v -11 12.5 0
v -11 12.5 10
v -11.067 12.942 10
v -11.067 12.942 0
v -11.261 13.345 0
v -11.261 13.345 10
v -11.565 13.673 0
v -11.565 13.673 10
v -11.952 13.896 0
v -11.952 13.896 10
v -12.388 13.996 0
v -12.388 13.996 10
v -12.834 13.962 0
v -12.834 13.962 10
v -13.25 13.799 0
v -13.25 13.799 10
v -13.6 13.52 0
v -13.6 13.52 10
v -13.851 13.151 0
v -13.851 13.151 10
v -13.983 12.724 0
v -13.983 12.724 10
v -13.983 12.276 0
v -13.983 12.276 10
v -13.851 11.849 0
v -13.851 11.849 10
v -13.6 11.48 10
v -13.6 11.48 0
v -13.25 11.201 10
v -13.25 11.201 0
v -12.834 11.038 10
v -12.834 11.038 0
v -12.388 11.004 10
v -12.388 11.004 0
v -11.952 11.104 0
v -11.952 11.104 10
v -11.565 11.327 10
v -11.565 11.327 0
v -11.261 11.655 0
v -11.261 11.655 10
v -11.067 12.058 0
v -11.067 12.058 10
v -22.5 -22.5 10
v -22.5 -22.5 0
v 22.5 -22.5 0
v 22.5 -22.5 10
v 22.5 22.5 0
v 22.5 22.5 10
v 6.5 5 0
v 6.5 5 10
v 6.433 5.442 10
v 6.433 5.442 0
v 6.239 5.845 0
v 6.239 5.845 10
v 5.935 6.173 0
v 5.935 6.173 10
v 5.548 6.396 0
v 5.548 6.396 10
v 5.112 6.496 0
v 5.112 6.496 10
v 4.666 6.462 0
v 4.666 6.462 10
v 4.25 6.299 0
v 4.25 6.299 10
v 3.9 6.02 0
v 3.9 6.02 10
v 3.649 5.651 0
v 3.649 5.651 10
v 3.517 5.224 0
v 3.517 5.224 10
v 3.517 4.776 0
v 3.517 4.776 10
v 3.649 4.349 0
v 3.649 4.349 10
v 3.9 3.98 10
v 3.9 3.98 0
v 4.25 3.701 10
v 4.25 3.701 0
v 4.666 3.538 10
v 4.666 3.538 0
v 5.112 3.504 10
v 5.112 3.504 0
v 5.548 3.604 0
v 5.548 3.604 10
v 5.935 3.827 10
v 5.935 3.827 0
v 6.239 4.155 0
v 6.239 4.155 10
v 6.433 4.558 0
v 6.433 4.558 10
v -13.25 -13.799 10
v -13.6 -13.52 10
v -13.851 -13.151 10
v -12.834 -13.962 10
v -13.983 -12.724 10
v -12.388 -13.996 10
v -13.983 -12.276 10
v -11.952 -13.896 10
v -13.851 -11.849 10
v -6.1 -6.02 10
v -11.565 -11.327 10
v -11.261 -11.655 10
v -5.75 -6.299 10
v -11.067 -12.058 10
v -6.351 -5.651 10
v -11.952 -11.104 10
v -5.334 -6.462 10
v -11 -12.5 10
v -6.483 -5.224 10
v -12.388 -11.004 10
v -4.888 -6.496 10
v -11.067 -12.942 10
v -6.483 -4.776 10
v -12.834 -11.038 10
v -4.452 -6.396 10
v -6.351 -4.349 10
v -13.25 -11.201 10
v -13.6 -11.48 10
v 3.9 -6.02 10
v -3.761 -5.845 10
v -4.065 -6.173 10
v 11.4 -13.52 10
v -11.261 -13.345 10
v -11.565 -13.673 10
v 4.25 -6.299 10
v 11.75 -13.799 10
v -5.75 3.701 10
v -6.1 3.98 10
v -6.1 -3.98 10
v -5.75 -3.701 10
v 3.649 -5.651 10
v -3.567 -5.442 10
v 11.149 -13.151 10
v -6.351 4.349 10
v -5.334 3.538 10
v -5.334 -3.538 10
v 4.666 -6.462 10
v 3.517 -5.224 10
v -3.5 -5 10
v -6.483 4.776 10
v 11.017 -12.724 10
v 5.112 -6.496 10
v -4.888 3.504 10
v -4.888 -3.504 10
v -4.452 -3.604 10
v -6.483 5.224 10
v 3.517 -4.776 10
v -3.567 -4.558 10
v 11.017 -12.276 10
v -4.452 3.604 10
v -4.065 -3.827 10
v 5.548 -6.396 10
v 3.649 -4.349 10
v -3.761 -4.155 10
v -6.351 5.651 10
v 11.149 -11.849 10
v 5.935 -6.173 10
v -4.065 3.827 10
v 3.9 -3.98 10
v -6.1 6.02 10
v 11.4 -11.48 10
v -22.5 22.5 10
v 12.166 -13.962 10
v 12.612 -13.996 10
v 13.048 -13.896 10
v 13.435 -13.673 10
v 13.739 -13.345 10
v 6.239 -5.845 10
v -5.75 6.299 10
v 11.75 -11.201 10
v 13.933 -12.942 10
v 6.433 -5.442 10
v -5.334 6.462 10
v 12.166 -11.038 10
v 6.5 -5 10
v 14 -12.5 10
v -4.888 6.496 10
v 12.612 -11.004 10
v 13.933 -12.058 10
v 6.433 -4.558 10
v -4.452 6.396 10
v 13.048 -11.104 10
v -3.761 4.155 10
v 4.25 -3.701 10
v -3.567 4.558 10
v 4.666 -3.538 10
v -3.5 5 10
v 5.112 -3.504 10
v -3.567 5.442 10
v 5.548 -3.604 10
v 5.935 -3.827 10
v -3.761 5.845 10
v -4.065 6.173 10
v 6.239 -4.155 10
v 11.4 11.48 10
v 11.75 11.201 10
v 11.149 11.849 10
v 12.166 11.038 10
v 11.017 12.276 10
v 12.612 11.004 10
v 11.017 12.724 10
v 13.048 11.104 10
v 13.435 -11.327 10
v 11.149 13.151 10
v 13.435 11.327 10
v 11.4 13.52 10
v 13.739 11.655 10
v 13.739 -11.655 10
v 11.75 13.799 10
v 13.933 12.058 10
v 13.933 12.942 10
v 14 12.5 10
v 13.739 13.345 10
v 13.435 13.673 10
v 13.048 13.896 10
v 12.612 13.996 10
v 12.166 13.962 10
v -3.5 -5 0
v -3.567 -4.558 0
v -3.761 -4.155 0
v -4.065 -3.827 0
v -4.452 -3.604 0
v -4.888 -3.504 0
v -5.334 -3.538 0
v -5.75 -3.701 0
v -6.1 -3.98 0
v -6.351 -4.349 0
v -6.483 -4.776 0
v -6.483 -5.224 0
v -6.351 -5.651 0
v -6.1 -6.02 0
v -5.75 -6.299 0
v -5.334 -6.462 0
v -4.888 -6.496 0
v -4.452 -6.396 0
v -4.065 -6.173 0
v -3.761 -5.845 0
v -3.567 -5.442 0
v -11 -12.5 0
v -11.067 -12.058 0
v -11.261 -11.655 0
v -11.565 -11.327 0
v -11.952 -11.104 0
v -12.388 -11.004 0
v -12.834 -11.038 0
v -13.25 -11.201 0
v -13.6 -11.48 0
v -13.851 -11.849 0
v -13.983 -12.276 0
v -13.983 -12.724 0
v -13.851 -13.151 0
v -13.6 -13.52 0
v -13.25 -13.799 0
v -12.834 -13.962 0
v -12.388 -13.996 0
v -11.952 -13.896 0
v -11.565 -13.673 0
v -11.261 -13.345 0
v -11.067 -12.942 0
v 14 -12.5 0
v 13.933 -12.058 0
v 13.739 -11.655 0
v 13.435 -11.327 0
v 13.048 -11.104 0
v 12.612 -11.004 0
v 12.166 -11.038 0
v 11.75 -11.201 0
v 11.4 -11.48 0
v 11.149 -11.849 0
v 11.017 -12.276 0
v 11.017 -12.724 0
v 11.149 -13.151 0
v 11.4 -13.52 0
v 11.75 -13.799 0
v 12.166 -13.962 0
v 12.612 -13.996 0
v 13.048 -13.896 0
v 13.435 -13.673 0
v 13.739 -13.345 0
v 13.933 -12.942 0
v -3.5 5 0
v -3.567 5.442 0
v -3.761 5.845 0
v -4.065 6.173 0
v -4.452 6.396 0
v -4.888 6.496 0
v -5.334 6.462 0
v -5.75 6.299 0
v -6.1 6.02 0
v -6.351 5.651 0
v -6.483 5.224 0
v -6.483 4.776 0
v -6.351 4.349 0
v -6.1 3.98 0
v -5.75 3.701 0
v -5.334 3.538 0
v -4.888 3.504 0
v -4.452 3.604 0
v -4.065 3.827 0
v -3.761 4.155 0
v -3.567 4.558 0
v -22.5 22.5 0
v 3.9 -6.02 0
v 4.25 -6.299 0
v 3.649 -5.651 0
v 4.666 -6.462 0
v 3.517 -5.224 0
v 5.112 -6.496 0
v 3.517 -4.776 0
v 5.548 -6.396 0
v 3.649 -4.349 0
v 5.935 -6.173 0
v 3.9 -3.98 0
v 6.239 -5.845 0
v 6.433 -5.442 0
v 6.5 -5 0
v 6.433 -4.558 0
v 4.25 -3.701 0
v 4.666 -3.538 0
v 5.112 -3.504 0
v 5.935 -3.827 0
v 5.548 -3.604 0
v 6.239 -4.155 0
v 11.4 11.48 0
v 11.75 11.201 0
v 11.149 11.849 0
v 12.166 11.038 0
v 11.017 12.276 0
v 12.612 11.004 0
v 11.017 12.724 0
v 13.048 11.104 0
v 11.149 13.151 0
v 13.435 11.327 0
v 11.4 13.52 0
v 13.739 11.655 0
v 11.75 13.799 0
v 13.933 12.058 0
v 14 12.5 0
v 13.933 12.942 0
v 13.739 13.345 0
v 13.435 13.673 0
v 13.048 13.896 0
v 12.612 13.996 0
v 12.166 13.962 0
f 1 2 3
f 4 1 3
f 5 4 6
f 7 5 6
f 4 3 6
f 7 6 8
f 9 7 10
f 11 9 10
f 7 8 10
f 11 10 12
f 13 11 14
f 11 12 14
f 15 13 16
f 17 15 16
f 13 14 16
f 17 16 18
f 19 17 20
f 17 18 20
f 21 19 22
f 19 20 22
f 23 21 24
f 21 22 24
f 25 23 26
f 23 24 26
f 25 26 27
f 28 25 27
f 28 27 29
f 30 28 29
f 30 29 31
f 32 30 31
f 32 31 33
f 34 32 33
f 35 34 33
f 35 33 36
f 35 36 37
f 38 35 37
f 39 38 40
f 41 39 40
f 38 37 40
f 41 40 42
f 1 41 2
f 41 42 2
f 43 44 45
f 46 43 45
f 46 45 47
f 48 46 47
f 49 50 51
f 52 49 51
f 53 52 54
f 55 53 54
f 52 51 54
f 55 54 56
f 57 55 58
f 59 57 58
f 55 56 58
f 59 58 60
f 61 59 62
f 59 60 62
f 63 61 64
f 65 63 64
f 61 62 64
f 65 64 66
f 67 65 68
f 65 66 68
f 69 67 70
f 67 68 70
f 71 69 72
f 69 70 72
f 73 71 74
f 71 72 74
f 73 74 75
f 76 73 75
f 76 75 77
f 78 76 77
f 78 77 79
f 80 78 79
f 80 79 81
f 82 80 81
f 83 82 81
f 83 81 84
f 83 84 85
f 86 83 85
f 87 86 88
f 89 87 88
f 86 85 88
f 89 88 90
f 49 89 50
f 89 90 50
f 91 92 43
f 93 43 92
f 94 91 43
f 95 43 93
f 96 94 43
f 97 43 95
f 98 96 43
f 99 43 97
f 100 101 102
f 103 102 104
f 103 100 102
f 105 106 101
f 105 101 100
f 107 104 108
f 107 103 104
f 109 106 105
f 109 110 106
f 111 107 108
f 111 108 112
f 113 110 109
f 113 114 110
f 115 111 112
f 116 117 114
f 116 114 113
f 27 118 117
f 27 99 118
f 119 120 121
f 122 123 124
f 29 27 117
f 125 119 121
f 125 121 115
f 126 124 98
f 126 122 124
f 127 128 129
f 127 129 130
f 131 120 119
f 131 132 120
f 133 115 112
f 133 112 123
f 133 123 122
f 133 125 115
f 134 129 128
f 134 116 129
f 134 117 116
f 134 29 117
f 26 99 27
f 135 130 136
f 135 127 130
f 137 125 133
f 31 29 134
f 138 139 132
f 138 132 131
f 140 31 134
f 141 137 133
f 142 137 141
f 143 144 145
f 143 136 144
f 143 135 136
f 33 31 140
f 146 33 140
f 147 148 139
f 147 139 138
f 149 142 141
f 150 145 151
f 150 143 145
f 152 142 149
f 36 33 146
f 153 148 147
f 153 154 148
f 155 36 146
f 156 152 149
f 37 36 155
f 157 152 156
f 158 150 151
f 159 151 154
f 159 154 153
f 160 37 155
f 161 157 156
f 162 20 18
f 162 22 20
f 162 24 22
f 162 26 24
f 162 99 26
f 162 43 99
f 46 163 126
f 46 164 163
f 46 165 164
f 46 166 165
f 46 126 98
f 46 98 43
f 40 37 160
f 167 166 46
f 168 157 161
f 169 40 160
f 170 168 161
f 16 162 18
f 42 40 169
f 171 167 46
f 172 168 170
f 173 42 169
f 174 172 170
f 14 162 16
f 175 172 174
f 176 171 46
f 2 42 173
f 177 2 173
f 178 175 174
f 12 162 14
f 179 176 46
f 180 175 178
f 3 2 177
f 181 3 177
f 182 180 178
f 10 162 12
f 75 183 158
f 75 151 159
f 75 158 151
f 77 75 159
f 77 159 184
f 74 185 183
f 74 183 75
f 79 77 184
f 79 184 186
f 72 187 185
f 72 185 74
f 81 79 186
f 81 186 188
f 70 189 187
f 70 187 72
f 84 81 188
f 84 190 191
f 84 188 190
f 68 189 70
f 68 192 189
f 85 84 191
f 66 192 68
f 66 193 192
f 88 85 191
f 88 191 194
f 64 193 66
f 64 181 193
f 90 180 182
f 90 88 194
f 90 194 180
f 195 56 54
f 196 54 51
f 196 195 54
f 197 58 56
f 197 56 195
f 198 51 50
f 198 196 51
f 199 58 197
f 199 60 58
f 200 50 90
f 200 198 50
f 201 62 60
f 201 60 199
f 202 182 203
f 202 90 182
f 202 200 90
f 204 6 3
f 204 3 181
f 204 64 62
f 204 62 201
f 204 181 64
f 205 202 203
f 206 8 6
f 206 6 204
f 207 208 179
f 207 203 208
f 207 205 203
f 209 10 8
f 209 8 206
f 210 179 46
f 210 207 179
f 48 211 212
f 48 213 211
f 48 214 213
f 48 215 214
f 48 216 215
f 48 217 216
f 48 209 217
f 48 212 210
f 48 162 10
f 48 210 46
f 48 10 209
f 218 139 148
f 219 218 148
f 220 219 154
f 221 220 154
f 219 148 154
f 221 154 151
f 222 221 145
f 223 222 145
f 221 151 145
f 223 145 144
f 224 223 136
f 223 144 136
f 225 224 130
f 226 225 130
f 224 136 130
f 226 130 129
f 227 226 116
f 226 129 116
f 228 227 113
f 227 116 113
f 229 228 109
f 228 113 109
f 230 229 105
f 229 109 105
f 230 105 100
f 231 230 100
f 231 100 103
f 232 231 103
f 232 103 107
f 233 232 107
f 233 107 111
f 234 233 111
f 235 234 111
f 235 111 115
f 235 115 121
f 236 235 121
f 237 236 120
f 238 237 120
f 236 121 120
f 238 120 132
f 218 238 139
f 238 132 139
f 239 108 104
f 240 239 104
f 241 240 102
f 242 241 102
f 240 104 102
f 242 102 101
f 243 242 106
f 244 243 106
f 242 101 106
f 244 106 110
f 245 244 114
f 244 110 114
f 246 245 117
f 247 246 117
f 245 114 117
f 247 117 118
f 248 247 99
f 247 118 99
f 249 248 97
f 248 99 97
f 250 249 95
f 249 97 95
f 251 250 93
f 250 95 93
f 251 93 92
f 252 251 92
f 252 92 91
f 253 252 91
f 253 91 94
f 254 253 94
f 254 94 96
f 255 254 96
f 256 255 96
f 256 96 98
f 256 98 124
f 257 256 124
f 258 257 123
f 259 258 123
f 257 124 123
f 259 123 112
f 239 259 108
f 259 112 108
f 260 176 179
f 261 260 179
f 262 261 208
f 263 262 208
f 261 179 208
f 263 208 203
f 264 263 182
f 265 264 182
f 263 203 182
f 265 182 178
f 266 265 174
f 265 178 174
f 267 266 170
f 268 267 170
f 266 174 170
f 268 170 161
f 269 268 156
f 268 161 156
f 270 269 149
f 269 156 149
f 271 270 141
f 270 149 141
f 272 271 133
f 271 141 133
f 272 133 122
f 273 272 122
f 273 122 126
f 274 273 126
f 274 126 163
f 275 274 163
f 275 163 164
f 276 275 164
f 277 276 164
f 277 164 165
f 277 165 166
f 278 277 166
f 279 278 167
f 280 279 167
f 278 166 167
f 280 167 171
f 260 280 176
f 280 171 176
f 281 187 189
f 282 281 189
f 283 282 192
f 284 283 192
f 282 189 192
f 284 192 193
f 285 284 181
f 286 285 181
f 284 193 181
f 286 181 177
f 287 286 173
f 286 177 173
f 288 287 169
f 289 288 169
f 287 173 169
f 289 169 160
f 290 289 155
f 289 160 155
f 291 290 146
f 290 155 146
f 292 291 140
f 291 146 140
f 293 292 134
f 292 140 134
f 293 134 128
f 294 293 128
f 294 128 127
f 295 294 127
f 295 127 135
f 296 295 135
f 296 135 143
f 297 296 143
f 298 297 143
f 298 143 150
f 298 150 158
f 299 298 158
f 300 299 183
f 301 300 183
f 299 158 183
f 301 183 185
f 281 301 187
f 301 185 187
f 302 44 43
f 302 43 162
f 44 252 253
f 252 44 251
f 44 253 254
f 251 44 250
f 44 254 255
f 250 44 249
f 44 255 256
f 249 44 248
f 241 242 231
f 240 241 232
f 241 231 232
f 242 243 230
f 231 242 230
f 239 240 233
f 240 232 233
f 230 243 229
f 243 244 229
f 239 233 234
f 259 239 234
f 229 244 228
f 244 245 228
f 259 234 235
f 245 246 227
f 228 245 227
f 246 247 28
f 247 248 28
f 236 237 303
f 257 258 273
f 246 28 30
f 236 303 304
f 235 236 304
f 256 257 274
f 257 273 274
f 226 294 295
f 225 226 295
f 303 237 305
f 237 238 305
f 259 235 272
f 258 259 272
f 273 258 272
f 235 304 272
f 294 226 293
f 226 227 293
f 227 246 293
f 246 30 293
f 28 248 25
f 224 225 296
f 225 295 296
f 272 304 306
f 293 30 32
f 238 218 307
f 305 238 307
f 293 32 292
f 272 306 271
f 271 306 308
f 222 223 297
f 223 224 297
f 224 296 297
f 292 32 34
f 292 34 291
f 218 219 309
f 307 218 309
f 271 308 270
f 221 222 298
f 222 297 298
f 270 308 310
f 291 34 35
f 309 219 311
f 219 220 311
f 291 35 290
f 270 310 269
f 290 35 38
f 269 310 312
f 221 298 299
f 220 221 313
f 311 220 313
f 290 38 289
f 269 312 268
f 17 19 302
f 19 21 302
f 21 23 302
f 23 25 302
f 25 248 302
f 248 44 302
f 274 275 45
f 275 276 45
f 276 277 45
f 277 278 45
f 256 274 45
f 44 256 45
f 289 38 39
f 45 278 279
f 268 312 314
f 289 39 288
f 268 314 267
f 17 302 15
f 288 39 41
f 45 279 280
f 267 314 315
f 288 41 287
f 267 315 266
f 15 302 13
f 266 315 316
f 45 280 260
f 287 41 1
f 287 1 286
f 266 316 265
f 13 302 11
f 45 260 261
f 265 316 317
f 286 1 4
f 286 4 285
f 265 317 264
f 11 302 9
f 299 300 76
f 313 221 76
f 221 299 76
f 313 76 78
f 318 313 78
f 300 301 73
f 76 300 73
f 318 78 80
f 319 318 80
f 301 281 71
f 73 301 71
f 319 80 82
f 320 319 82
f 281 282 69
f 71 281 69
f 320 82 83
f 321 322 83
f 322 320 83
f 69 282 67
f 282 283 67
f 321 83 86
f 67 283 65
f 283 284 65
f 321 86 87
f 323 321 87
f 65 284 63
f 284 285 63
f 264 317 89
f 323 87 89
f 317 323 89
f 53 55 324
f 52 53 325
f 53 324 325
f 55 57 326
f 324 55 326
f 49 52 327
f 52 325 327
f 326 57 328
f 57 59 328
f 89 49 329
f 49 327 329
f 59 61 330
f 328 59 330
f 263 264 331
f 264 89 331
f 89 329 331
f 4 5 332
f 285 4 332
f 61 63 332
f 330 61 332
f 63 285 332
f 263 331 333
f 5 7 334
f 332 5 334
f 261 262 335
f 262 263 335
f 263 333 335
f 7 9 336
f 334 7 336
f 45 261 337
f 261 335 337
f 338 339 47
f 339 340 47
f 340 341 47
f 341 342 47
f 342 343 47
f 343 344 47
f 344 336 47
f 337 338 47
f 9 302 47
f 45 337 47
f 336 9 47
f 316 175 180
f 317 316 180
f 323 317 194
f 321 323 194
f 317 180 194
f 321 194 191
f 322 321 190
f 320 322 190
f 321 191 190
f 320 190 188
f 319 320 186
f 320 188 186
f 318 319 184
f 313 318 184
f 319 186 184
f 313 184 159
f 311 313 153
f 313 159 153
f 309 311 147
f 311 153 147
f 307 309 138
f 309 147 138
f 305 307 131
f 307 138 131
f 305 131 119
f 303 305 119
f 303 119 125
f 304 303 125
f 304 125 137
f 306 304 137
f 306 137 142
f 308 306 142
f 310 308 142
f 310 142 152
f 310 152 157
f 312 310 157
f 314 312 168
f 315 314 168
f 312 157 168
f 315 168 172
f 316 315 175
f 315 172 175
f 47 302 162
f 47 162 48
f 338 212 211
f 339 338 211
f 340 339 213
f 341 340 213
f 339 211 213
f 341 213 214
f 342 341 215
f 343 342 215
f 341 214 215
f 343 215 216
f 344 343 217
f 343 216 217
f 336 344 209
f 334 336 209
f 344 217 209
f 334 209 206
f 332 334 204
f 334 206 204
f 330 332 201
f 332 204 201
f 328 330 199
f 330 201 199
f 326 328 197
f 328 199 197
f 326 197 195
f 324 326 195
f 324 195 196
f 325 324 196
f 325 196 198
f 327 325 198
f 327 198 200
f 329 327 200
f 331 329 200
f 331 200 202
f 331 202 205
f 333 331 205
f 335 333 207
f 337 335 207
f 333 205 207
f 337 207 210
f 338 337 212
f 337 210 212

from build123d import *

# Parameters (mm, degrees)
SKETCH1_W           = 45
SKETCH1_H           = 45
BOSS_EXTRUDE1_DEPTH = 10
SKETCH2_R           = 1.5
CUT_EXTRUDE1_DEPTH  = 10
SKETCH3_R           = 1.5
CUT_EXTRUDE2_DEPTH  = 10


with BuildPart() as part:
    # Sketch1 → Boss-Extrude1 (new body)
    with BuildSketch(Plane.XY):
        Rectangle(SKETCH1_W, SKETCH1_H)
    extrude(amount=BOSS_EXTRUDE1_DEPTH)

    # Sketch2 → Cut-Extrude1 (cut)
    with BuildSketch(Plane.XY.offset(10)):
        with Locations((-12.5, 12.5)):
            Circle(SKETCH2_R)
        with Locations((12.5, 12.5)):
            Circle(SKETCH2_R)
        with Locations((12.5, -12.5)):
            Circle(SKETCH2_R)
        with Locations((-12.5, -12.5)):
            Circle(SKETCH2_R)
    extrude(amount=-CUT_EXTRUDE1_DEPTH, mode=Mode.SUBTRACT)

    # Sketch3 → Cut-Extrude2 (cut)
    with BuildSketch(Plane.XY.offset(10)):
        with Locations((-5, 5)):
            Circle(SKETCH3_R)
        with Locations((5, 5)):
            Circle(SKETCH3_R)
        with Locations((5, -5)):
            Circle(SKETCH3_R)
        with Locations((-5, -5)):
            Circle(SKETCH3_R)
    extrude(amount=-CUT_EXTRUDE2_DEPTH, mode=Mode.SUBTRACT)


solid = part.part
